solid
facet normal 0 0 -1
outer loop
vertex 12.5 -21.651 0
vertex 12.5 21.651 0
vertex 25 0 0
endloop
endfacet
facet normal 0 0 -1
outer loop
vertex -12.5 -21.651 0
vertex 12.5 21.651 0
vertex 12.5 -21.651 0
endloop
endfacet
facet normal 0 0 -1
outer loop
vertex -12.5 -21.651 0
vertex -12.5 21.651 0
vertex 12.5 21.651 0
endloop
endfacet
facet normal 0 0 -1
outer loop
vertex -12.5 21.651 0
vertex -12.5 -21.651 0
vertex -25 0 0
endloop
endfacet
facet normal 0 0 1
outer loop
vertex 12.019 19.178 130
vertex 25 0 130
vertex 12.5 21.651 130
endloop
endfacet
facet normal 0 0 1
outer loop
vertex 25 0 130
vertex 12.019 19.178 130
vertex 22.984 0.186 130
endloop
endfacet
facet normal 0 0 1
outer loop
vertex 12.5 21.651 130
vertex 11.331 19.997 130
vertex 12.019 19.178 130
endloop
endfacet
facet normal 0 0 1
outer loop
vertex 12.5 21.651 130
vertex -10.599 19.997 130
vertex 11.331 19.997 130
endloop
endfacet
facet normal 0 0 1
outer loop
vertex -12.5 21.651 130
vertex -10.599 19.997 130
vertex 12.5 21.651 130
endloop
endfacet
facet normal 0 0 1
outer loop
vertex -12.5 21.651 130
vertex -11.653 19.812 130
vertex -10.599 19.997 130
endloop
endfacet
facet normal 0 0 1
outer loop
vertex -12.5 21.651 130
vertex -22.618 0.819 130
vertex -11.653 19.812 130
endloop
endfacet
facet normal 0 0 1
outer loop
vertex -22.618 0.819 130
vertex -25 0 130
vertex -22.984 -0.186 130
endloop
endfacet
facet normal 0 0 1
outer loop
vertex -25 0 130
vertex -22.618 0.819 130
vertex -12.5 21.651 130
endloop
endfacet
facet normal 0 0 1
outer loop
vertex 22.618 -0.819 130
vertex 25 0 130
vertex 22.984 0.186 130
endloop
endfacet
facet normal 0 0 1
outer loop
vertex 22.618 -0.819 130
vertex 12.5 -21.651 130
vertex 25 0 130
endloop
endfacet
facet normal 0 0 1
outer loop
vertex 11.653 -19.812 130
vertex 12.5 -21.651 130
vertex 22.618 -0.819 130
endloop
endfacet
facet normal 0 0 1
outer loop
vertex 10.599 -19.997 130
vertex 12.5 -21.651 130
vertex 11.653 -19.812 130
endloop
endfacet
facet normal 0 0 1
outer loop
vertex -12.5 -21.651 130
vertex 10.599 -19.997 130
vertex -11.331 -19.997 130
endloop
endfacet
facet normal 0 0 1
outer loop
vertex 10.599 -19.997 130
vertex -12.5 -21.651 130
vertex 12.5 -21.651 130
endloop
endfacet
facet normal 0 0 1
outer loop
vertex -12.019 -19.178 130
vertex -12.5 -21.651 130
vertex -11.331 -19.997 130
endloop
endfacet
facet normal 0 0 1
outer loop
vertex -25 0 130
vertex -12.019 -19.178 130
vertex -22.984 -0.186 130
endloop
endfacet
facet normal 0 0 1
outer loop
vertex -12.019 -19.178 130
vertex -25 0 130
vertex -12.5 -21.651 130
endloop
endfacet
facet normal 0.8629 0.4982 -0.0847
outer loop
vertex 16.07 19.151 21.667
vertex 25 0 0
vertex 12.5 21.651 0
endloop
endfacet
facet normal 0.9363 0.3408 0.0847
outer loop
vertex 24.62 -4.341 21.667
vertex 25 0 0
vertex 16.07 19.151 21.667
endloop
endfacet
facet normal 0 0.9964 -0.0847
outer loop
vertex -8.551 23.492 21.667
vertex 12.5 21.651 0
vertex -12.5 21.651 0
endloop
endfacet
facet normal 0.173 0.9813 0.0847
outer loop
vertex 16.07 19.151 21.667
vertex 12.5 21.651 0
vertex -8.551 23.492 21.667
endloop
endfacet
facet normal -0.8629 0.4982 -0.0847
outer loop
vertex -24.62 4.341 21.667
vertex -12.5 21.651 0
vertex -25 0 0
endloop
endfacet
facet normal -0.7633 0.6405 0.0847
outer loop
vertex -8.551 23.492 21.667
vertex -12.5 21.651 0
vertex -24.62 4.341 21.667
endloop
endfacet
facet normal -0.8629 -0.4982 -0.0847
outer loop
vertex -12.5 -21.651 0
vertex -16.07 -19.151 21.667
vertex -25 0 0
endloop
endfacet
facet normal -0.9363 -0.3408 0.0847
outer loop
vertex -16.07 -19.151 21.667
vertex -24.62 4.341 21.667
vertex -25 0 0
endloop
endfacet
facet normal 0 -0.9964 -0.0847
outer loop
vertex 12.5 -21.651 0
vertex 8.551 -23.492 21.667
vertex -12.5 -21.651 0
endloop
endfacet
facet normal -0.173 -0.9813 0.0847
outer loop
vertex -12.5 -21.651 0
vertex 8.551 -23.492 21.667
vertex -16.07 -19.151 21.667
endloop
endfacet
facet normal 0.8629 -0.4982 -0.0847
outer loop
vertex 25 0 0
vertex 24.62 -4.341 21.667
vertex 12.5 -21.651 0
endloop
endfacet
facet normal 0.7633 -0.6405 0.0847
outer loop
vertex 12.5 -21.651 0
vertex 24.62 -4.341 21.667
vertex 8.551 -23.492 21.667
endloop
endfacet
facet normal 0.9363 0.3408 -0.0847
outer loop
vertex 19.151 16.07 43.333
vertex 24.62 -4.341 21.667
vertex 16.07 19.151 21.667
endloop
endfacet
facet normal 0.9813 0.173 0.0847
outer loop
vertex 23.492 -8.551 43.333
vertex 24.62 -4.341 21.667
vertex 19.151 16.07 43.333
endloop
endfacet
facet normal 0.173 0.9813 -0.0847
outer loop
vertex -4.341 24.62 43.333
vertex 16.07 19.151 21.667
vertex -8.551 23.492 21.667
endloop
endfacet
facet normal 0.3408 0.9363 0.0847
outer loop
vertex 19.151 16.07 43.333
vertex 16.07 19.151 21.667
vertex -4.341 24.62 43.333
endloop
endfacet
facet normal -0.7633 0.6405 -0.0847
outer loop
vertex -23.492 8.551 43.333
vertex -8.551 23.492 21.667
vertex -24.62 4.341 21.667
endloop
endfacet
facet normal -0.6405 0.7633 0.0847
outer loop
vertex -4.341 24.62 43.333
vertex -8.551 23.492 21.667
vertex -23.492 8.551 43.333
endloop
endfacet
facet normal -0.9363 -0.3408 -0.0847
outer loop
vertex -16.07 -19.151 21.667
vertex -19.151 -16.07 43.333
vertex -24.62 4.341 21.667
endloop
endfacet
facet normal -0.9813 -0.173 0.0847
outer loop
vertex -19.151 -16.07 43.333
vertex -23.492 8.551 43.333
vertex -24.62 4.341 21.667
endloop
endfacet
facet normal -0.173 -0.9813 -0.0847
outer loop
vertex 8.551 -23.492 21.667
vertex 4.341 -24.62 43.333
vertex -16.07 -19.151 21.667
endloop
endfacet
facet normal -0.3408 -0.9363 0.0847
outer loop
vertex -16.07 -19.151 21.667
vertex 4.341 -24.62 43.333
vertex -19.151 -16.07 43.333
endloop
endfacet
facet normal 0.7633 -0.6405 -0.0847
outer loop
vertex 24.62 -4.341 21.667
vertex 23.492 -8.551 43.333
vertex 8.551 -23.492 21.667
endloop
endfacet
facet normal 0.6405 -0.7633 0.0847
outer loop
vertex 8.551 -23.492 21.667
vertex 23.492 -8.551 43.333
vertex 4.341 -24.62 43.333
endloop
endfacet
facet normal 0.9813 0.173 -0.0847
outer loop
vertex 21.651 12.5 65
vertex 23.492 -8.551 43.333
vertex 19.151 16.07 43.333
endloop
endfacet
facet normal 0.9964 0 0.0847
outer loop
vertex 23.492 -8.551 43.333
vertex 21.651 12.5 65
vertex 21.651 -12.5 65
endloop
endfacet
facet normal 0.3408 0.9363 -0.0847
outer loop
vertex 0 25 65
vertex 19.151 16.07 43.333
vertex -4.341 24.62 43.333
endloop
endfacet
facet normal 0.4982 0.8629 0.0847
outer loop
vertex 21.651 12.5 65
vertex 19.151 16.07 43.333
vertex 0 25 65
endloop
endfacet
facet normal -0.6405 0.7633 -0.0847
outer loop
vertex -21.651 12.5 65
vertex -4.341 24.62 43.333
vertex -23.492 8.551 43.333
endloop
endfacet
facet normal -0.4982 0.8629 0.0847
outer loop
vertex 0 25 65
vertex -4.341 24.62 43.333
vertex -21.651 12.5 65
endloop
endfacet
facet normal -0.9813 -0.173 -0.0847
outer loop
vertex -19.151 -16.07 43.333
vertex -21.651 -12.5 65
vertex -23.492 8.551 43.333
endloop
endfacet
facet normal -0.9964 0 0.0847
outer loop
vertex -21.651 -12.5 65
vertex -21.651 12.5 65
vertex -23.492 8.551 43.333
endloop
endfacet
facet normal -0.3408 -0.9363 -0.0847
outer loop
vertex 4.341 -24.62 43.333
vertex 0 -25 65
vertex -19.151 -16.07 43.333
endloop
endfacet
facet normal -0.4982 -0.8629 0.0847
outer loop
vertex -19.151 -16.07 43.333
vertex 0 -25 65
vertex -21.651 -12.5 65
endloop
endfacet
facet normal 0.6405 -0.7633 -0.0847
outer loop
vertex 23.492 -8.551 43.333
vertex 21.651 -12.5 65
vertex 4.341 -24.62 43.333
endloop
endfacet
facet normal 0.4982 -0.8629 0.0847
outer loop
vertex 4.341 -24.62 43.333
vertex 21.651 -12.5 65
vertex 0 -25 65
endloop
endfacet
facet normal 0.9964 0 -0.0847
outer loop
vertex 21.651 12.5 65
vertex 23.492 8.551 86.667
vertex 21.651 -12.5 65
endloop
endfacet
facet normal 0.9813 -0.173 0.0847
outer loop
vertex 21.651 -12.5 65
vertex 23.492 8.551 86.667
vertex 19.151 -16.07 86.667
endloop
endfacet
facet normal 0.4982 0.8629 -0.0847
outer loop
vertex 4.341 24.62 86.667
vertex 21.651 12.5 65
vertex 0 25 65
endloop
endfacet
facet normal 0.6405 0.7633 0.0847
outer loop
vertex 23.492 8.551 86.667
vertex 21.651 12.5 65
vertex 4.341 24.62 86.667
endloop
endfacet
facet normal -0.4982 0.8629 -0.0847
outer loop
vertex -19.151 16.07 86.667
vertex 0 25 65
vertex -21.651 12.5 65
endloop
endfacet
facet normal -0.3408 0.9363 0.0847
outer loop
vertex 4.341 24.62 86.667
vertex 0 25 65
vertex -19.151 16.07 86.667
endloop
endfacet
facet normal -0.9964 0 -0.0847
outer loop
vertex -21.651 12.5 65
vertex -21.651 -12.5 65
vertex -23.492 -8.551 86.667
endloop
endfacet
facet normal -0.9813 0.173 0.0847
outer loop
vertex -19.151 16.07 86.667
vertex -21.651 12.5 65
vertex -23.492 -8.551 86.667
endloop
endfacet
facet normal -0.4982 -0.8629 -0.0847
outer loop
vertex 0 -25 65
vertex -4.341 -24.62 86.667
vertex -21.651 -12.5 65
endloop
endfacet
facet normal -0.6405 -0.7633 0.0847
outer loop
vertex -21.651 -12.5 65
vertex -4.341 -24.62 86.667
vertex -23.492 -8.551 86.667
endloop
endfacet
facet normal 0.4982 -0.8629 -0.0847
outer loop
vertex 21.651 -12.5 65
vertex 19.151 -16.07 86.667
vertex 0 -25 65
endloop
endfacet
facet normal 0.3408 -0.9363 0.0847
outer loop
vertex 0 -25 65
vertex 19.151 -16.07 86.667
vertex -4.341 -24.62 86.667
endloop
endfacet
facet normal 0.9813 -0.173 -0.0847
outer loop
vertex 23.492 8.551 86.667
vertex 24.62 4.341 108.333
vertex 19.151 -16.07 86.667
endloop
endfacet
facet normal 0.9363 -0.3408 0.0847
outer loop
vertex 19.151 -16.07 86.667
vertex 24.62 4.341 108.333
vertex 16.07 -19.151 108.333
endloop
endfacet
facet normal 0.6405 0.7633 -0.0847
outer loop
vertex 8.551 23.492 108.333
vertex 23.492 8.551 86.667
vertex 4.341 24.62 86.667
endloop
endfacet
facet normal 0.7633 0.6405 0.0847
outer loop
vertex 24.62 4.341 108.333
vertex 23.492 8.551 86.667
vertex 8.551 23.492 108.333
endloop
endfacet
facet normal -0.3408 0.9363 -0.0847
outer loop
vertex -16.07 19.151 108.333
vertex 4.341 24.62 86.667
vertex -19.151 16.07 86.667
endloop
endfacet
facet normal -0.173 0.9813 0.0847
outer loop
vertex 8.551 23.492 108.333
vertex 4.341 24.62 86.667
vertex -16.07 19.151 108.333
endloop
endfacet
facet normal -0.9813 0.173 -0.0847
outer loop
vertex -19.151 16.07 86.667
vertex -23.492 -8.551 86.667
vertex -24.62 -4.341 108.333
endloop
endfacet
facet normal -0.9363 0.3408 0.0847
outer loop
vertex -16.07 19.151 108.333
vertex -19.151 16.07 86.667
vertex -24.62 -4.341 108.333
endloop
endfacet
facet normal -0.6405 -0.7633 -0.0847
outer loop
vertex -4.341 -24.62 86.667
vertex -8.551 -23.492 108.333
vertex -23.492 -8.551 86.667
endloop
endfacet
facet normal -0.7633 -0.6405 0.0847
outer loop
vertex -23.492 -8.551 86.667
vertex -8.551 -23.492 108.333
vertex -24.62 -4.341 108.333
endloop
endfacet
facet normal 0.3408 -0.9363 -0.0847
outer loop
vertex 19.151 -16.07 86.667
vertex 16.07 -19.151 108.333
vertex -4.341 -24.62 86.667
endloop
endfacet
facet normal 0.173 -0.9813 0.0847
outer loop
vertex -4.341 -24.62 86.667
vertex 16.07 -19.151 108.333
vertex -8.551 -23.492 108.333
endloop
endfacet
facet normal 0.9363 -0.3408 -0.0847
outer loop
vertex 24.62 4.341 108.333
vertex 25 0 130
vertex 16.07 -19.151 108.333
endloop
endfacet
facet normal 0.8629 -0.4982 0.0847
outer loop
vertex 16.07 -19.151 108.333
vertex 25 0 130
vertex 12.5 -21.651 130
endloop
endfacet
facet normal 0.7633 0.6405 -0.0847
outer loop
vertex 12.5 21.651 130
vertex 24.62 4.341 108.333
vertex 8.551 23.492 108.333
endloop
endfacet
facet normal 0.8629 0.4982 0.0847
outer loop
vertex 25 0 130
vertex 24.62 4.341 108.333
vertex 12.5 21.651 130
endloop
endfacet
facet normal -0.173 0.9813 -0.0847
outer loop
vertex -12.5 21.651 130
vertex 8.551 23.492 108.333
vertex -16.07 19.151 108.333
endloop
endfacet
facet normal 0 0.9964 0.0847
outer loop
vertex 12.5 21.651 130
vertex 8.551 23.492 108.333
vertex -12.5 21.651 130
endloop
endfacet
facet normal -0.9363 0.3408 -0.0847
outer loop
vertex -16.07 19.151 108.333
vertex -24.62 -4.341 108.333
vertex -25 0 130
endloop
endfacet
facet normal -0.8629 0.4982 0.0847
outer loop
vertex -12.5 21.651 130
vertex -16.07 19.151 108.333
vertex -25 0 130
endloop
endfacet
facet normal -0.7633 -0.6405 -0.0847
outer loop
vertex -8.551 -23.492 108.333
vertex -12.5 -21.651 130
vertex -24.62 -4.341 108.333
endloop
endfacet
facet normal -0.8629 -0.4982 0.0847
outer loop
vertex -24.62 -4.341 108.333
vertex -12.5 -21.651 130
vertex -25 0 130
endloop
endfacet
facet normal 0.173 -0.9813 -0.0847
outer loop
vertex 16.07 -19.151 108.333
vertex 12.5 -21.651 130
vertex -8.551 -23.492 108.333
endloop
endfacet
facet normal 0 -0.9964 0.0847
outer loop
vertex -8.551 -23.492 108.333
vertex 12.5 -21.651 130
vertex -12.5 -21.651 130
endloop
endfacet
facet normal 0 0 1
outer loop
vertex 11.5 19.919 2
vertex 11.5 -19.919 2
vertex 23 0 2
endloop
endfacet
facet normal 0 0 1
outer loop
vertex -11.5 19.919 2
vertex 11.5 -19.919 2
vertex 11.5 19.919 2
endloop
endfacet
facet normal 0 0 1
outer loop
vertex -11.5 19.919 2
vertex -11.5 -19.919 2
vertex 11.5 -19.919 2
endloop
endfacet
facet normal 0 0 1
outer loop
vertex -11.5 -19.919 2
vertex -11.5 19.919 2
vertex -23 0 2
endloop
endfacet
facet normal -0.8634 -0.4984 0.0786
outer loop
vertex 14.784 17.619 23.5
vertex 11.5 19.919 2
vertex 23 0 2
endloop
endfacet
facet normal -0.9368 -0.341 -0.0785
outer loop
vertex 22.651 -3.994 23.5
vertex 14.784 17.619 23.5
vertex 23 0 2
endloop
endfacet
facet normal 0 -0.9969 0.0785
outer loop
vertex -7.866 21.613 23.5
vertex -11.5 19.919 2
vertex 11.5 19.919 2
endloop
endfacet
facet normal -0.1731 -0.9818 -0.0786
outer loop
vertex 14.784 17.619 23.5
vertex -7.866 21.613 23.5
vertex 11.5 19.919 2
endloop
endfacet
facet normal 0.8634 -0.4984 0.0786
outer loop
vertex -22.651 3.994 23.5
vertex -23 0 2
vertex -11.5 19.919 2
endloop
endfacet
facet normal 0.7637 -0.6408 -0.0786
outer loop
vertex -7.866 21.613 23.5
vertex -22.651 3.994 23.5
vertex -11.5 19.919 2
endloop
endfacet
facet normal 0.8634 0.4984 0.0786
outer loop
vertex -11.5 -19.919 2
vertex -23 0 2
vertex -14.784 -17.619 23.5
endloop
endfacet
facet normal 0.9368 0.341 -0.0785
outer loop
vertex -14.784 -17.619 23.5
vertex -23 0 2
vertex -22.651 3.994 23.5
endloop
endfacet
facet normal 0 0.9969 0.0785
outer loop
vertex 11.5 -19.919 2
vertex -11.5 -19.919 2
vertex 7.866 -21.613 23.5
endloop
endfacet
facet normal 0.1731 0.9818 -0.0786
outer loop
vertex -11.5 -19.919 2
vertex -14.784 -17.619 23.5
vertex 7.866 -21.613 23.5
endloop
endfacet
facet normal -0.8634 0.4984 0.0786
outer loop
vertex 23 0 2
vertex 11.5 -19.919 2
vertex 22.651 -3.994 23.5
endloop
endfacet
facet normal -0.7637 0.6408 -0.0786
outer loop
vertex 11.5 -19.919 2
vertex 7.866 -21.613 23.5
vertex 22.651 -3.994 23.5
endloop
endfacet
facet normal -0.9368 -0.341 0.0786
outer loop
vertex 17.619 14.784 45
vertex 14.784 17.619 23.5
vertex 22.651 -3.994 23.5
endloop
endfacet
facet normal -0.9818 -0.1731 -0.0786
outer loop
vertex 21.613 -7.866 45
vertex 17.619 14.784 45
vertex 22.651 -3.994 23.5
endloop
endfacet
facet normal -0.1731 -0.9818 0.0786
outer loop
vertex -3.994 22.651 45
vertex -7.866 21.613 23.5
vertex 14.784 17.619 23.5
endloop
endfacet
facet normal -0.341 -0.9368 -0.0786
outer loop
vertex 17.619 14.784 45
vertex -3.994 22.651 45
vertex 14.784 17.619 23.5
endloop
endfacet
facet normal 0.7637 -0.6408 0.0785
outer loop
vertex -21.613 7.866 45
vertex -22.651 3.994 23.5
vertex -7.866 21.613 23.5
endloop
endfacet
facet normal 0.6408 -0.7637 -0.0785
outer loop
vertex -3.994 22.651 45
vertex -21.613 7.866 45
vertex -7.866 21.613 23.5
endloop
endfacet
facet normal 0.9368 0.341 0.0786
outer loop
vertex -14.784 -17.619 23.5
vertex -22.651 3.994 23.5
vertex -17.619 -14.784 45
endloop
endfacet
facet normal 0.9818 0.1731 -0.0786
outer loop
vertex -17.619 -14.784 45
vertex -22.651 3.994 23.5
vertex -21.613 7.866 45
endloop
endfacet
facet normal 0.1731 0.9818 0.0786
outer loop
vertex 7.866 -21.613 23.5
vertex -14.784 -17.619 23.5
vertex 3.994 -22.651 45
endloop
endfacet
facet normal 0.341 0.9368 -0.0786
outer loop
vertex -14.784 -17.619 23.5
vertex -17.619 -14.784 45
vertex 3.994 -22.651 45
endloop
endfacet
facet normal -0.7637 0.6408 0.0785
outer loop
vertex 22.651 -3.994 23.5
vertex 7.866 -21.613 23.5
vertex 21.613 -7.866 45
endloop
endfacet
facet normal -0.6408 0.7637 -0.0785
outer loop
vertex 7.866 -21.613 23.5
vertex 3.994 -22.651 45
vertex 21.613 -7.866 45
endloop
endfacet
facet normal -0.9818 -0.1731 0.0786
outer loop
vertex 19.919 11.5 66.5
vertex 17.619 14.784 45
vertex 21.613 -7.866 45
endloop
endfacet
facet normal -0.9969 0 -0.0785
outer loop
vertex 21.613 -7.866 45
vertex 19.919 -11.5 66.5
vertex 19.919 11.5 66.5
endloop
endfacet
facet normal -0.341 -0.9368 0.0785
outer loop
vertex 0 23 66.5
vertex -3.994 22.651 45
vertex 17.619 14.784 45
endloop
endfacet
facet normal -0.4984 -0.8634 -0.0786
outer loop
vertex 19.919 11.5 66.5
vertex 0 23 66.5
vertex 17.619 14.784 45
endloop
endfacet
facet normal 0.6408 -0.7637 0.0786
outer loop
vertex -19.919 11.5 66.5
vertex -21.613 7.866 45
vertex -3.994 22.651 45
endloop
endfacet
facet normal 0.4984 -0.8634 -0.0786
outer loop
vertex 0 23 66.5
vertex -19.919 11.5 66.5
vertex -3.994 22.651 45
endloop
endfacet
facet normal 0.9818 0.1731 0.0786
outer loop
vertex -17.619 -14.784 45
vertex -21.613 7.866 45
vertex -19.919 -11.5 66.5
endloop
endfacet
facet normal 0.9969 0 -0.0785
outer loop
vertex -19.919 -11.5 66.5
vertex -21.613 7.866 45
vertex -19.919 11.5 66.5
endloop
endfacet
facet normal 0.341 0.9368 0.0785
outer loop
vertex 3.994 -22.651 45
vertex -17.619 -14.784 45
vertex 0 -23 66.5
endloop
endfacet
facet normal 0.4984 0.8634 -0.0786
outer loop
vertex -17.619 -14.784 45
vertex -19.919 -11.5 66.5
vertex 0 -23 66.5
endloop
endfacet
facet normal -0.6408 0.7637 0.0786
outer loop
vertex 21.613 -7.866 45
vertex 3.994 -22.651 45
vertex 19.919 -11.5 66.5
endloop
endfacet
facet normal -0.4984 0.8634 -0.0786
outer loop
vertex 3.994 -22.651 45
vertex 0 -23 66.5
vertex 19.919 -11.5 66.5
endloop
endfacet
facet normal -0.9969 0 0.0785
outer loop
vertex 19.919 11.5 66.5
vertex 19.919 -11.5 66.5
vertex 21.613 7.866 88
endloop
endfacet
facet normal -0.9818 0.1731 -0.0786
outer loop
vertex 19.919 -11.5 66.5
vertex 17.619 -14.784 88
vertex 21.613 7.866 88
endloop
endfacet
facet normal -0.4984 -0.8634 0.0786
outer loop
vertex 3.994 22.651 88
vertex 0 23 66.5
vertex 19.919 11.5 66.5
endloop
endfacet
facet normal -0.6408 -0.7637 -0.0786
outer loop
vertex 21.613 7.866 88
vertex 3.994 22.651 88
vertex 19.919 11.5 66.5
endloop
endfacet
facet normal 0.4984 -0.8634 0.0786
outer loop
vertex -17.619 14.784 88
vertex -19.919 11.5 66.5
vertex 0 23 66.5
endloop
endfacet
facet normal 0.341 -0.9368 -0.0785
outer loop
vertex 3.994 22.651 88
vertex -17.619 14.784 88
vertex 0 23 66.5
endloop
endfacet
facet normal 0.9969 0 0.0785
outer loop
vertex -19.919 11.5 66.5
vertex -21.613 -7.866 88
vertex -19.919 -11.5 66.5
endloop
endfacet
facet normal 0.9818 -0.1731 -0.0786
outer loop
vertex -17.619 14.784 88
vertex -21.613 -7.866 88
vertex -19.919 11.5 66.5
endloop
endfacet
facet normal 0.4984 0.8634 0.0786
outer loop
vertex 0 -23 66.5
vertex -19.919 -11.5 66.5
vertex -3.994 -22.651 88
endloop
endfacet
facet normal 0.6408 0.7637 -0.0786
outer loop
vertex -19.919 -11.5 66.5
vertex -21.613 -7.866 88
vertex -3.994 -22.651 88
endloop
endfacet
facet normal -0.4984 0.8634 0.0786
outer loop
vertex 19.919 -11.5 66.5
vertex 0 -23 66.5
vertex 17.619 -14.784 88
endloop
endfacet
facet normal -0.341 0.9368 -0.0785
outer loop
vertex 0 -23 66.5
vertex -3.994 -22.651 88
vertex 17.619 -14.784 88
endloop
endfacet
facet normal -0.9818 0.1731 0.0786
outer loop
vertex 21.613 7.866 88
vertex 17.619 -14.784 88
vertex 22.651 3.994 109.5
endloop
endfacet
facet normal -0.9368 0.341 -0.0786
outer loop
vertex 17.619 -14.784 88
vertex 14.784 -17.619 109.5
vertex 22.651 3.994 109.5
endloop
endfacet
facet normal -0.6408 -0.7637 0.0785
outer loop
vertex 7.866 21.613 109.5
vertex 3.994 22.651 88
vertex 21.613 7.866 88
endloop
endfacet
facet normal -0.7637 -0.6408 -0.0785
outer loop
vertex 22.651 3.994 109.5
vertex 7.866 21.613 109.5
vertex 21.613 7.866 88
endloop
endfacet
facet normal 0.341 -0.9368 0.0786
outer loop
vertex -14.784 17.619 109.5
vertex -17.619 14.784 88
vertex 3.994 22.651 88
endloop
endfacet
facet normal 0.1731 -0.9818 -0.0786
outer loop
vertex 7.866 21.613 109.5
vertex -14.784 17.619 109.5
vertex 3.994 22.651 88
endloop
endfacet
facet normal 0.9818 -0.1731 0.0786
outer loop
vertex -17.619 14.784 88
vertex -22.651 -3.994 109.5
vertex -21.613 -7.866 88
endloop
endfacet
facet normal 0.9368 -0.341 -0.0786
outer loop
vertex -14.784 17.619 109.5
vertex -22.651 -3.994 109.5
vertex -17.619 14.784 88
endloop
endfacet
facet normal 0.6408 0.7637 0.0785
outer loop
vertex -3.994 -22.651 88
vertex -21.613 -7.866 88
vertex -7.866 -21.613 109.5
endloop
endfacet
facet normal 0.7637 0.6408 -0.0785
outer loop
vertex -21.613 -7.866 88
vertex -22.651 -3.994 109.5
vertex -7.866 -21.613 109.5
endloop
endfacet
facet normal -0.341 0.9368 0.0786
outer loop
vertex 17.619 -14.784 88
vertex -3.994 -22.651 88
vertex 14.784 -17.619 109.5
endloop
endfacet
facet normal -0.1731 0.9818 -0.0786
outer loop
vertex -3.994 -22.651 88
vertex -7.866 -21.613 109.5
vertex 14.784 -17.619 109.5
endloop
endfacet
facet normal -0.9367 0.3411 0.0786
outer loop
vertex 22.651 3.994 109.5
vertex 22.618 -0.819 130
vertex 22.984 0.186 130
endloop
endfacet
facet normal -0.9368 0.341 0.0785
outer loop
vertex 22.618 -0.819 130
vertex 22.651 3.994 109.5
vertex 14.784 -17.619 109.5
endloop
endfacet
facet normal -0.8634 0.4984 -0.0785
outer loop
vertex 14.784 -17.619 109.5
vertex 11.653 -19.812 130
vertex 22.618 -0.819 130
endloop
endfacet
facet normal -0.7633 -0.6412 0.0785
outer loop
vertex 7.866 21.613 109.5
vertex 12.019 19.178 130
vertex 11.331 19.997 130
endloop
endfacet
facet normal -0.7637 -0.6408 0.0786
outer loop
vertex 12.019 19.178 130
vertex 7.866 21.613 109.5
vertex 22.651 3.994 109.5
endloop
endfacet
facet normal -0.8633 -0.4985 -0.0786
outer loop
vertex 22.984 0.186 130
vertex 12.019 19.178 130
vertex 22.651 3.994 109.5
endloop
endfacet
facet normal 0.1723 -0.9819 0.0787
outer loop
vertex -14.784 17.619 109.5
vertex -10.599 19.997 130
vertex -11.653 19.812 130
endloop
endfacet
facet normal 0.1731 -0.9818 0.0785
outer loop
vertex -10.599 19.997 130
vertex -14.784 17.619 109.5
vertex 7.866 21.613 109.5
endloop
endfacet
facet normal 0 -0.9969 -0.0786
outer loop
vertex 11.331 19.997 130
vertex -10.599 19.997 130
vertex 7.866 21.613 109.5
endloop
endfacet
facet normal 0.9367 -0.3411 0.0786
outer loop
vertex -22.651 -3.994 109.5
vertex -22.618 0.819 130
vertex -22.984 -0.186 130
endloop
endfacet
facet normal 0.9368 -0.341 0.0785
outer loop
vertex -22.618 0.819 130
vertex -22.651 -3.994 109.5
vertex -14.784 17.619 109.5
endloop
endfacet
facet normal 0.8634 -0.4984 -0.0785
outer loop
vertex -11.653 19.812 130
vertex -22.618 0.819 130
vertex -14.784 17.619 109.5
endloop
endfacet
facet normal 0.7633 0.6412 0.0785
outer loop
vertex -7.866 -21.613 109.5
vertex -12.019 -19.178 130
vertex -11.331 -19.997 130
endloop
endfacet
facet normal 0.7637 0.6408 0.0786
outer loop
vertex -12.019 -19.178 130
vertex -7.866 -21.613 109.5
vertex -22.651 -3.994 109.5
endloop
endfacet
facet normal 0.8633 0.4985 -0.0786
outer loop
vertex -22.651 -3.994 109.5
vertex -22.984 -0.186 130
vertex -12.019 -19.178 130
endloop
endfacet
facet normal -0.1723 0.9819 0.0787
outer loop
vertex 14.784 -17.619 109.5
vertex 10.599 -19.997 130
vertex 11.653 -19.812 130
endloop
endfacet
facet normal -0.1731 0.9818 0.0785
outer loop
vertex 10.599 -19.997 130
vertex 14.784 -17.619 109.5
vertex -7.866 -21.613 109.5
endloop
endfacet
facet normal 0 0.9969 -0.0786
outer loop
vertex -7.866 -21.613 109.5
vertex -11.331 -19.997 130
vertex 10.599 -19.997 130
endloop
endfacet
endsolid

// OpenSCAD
radius = 25;//[5:100]
wall = 2;//[1:10]
height = 130;//[50:150]
twist = 60;//[0:180]


difference(){
linear_extrude(height = height, center = false, convexity = 0, twist = twist, slices=height/20)
circle(r = radius, $fn=6);
translate([0,0,wall])
linear_extrude(height=height-wall+1, center=false, convexity=0, twist=twist, slices=height/20)
circle(r = radius-wall, $fn=6);
}
